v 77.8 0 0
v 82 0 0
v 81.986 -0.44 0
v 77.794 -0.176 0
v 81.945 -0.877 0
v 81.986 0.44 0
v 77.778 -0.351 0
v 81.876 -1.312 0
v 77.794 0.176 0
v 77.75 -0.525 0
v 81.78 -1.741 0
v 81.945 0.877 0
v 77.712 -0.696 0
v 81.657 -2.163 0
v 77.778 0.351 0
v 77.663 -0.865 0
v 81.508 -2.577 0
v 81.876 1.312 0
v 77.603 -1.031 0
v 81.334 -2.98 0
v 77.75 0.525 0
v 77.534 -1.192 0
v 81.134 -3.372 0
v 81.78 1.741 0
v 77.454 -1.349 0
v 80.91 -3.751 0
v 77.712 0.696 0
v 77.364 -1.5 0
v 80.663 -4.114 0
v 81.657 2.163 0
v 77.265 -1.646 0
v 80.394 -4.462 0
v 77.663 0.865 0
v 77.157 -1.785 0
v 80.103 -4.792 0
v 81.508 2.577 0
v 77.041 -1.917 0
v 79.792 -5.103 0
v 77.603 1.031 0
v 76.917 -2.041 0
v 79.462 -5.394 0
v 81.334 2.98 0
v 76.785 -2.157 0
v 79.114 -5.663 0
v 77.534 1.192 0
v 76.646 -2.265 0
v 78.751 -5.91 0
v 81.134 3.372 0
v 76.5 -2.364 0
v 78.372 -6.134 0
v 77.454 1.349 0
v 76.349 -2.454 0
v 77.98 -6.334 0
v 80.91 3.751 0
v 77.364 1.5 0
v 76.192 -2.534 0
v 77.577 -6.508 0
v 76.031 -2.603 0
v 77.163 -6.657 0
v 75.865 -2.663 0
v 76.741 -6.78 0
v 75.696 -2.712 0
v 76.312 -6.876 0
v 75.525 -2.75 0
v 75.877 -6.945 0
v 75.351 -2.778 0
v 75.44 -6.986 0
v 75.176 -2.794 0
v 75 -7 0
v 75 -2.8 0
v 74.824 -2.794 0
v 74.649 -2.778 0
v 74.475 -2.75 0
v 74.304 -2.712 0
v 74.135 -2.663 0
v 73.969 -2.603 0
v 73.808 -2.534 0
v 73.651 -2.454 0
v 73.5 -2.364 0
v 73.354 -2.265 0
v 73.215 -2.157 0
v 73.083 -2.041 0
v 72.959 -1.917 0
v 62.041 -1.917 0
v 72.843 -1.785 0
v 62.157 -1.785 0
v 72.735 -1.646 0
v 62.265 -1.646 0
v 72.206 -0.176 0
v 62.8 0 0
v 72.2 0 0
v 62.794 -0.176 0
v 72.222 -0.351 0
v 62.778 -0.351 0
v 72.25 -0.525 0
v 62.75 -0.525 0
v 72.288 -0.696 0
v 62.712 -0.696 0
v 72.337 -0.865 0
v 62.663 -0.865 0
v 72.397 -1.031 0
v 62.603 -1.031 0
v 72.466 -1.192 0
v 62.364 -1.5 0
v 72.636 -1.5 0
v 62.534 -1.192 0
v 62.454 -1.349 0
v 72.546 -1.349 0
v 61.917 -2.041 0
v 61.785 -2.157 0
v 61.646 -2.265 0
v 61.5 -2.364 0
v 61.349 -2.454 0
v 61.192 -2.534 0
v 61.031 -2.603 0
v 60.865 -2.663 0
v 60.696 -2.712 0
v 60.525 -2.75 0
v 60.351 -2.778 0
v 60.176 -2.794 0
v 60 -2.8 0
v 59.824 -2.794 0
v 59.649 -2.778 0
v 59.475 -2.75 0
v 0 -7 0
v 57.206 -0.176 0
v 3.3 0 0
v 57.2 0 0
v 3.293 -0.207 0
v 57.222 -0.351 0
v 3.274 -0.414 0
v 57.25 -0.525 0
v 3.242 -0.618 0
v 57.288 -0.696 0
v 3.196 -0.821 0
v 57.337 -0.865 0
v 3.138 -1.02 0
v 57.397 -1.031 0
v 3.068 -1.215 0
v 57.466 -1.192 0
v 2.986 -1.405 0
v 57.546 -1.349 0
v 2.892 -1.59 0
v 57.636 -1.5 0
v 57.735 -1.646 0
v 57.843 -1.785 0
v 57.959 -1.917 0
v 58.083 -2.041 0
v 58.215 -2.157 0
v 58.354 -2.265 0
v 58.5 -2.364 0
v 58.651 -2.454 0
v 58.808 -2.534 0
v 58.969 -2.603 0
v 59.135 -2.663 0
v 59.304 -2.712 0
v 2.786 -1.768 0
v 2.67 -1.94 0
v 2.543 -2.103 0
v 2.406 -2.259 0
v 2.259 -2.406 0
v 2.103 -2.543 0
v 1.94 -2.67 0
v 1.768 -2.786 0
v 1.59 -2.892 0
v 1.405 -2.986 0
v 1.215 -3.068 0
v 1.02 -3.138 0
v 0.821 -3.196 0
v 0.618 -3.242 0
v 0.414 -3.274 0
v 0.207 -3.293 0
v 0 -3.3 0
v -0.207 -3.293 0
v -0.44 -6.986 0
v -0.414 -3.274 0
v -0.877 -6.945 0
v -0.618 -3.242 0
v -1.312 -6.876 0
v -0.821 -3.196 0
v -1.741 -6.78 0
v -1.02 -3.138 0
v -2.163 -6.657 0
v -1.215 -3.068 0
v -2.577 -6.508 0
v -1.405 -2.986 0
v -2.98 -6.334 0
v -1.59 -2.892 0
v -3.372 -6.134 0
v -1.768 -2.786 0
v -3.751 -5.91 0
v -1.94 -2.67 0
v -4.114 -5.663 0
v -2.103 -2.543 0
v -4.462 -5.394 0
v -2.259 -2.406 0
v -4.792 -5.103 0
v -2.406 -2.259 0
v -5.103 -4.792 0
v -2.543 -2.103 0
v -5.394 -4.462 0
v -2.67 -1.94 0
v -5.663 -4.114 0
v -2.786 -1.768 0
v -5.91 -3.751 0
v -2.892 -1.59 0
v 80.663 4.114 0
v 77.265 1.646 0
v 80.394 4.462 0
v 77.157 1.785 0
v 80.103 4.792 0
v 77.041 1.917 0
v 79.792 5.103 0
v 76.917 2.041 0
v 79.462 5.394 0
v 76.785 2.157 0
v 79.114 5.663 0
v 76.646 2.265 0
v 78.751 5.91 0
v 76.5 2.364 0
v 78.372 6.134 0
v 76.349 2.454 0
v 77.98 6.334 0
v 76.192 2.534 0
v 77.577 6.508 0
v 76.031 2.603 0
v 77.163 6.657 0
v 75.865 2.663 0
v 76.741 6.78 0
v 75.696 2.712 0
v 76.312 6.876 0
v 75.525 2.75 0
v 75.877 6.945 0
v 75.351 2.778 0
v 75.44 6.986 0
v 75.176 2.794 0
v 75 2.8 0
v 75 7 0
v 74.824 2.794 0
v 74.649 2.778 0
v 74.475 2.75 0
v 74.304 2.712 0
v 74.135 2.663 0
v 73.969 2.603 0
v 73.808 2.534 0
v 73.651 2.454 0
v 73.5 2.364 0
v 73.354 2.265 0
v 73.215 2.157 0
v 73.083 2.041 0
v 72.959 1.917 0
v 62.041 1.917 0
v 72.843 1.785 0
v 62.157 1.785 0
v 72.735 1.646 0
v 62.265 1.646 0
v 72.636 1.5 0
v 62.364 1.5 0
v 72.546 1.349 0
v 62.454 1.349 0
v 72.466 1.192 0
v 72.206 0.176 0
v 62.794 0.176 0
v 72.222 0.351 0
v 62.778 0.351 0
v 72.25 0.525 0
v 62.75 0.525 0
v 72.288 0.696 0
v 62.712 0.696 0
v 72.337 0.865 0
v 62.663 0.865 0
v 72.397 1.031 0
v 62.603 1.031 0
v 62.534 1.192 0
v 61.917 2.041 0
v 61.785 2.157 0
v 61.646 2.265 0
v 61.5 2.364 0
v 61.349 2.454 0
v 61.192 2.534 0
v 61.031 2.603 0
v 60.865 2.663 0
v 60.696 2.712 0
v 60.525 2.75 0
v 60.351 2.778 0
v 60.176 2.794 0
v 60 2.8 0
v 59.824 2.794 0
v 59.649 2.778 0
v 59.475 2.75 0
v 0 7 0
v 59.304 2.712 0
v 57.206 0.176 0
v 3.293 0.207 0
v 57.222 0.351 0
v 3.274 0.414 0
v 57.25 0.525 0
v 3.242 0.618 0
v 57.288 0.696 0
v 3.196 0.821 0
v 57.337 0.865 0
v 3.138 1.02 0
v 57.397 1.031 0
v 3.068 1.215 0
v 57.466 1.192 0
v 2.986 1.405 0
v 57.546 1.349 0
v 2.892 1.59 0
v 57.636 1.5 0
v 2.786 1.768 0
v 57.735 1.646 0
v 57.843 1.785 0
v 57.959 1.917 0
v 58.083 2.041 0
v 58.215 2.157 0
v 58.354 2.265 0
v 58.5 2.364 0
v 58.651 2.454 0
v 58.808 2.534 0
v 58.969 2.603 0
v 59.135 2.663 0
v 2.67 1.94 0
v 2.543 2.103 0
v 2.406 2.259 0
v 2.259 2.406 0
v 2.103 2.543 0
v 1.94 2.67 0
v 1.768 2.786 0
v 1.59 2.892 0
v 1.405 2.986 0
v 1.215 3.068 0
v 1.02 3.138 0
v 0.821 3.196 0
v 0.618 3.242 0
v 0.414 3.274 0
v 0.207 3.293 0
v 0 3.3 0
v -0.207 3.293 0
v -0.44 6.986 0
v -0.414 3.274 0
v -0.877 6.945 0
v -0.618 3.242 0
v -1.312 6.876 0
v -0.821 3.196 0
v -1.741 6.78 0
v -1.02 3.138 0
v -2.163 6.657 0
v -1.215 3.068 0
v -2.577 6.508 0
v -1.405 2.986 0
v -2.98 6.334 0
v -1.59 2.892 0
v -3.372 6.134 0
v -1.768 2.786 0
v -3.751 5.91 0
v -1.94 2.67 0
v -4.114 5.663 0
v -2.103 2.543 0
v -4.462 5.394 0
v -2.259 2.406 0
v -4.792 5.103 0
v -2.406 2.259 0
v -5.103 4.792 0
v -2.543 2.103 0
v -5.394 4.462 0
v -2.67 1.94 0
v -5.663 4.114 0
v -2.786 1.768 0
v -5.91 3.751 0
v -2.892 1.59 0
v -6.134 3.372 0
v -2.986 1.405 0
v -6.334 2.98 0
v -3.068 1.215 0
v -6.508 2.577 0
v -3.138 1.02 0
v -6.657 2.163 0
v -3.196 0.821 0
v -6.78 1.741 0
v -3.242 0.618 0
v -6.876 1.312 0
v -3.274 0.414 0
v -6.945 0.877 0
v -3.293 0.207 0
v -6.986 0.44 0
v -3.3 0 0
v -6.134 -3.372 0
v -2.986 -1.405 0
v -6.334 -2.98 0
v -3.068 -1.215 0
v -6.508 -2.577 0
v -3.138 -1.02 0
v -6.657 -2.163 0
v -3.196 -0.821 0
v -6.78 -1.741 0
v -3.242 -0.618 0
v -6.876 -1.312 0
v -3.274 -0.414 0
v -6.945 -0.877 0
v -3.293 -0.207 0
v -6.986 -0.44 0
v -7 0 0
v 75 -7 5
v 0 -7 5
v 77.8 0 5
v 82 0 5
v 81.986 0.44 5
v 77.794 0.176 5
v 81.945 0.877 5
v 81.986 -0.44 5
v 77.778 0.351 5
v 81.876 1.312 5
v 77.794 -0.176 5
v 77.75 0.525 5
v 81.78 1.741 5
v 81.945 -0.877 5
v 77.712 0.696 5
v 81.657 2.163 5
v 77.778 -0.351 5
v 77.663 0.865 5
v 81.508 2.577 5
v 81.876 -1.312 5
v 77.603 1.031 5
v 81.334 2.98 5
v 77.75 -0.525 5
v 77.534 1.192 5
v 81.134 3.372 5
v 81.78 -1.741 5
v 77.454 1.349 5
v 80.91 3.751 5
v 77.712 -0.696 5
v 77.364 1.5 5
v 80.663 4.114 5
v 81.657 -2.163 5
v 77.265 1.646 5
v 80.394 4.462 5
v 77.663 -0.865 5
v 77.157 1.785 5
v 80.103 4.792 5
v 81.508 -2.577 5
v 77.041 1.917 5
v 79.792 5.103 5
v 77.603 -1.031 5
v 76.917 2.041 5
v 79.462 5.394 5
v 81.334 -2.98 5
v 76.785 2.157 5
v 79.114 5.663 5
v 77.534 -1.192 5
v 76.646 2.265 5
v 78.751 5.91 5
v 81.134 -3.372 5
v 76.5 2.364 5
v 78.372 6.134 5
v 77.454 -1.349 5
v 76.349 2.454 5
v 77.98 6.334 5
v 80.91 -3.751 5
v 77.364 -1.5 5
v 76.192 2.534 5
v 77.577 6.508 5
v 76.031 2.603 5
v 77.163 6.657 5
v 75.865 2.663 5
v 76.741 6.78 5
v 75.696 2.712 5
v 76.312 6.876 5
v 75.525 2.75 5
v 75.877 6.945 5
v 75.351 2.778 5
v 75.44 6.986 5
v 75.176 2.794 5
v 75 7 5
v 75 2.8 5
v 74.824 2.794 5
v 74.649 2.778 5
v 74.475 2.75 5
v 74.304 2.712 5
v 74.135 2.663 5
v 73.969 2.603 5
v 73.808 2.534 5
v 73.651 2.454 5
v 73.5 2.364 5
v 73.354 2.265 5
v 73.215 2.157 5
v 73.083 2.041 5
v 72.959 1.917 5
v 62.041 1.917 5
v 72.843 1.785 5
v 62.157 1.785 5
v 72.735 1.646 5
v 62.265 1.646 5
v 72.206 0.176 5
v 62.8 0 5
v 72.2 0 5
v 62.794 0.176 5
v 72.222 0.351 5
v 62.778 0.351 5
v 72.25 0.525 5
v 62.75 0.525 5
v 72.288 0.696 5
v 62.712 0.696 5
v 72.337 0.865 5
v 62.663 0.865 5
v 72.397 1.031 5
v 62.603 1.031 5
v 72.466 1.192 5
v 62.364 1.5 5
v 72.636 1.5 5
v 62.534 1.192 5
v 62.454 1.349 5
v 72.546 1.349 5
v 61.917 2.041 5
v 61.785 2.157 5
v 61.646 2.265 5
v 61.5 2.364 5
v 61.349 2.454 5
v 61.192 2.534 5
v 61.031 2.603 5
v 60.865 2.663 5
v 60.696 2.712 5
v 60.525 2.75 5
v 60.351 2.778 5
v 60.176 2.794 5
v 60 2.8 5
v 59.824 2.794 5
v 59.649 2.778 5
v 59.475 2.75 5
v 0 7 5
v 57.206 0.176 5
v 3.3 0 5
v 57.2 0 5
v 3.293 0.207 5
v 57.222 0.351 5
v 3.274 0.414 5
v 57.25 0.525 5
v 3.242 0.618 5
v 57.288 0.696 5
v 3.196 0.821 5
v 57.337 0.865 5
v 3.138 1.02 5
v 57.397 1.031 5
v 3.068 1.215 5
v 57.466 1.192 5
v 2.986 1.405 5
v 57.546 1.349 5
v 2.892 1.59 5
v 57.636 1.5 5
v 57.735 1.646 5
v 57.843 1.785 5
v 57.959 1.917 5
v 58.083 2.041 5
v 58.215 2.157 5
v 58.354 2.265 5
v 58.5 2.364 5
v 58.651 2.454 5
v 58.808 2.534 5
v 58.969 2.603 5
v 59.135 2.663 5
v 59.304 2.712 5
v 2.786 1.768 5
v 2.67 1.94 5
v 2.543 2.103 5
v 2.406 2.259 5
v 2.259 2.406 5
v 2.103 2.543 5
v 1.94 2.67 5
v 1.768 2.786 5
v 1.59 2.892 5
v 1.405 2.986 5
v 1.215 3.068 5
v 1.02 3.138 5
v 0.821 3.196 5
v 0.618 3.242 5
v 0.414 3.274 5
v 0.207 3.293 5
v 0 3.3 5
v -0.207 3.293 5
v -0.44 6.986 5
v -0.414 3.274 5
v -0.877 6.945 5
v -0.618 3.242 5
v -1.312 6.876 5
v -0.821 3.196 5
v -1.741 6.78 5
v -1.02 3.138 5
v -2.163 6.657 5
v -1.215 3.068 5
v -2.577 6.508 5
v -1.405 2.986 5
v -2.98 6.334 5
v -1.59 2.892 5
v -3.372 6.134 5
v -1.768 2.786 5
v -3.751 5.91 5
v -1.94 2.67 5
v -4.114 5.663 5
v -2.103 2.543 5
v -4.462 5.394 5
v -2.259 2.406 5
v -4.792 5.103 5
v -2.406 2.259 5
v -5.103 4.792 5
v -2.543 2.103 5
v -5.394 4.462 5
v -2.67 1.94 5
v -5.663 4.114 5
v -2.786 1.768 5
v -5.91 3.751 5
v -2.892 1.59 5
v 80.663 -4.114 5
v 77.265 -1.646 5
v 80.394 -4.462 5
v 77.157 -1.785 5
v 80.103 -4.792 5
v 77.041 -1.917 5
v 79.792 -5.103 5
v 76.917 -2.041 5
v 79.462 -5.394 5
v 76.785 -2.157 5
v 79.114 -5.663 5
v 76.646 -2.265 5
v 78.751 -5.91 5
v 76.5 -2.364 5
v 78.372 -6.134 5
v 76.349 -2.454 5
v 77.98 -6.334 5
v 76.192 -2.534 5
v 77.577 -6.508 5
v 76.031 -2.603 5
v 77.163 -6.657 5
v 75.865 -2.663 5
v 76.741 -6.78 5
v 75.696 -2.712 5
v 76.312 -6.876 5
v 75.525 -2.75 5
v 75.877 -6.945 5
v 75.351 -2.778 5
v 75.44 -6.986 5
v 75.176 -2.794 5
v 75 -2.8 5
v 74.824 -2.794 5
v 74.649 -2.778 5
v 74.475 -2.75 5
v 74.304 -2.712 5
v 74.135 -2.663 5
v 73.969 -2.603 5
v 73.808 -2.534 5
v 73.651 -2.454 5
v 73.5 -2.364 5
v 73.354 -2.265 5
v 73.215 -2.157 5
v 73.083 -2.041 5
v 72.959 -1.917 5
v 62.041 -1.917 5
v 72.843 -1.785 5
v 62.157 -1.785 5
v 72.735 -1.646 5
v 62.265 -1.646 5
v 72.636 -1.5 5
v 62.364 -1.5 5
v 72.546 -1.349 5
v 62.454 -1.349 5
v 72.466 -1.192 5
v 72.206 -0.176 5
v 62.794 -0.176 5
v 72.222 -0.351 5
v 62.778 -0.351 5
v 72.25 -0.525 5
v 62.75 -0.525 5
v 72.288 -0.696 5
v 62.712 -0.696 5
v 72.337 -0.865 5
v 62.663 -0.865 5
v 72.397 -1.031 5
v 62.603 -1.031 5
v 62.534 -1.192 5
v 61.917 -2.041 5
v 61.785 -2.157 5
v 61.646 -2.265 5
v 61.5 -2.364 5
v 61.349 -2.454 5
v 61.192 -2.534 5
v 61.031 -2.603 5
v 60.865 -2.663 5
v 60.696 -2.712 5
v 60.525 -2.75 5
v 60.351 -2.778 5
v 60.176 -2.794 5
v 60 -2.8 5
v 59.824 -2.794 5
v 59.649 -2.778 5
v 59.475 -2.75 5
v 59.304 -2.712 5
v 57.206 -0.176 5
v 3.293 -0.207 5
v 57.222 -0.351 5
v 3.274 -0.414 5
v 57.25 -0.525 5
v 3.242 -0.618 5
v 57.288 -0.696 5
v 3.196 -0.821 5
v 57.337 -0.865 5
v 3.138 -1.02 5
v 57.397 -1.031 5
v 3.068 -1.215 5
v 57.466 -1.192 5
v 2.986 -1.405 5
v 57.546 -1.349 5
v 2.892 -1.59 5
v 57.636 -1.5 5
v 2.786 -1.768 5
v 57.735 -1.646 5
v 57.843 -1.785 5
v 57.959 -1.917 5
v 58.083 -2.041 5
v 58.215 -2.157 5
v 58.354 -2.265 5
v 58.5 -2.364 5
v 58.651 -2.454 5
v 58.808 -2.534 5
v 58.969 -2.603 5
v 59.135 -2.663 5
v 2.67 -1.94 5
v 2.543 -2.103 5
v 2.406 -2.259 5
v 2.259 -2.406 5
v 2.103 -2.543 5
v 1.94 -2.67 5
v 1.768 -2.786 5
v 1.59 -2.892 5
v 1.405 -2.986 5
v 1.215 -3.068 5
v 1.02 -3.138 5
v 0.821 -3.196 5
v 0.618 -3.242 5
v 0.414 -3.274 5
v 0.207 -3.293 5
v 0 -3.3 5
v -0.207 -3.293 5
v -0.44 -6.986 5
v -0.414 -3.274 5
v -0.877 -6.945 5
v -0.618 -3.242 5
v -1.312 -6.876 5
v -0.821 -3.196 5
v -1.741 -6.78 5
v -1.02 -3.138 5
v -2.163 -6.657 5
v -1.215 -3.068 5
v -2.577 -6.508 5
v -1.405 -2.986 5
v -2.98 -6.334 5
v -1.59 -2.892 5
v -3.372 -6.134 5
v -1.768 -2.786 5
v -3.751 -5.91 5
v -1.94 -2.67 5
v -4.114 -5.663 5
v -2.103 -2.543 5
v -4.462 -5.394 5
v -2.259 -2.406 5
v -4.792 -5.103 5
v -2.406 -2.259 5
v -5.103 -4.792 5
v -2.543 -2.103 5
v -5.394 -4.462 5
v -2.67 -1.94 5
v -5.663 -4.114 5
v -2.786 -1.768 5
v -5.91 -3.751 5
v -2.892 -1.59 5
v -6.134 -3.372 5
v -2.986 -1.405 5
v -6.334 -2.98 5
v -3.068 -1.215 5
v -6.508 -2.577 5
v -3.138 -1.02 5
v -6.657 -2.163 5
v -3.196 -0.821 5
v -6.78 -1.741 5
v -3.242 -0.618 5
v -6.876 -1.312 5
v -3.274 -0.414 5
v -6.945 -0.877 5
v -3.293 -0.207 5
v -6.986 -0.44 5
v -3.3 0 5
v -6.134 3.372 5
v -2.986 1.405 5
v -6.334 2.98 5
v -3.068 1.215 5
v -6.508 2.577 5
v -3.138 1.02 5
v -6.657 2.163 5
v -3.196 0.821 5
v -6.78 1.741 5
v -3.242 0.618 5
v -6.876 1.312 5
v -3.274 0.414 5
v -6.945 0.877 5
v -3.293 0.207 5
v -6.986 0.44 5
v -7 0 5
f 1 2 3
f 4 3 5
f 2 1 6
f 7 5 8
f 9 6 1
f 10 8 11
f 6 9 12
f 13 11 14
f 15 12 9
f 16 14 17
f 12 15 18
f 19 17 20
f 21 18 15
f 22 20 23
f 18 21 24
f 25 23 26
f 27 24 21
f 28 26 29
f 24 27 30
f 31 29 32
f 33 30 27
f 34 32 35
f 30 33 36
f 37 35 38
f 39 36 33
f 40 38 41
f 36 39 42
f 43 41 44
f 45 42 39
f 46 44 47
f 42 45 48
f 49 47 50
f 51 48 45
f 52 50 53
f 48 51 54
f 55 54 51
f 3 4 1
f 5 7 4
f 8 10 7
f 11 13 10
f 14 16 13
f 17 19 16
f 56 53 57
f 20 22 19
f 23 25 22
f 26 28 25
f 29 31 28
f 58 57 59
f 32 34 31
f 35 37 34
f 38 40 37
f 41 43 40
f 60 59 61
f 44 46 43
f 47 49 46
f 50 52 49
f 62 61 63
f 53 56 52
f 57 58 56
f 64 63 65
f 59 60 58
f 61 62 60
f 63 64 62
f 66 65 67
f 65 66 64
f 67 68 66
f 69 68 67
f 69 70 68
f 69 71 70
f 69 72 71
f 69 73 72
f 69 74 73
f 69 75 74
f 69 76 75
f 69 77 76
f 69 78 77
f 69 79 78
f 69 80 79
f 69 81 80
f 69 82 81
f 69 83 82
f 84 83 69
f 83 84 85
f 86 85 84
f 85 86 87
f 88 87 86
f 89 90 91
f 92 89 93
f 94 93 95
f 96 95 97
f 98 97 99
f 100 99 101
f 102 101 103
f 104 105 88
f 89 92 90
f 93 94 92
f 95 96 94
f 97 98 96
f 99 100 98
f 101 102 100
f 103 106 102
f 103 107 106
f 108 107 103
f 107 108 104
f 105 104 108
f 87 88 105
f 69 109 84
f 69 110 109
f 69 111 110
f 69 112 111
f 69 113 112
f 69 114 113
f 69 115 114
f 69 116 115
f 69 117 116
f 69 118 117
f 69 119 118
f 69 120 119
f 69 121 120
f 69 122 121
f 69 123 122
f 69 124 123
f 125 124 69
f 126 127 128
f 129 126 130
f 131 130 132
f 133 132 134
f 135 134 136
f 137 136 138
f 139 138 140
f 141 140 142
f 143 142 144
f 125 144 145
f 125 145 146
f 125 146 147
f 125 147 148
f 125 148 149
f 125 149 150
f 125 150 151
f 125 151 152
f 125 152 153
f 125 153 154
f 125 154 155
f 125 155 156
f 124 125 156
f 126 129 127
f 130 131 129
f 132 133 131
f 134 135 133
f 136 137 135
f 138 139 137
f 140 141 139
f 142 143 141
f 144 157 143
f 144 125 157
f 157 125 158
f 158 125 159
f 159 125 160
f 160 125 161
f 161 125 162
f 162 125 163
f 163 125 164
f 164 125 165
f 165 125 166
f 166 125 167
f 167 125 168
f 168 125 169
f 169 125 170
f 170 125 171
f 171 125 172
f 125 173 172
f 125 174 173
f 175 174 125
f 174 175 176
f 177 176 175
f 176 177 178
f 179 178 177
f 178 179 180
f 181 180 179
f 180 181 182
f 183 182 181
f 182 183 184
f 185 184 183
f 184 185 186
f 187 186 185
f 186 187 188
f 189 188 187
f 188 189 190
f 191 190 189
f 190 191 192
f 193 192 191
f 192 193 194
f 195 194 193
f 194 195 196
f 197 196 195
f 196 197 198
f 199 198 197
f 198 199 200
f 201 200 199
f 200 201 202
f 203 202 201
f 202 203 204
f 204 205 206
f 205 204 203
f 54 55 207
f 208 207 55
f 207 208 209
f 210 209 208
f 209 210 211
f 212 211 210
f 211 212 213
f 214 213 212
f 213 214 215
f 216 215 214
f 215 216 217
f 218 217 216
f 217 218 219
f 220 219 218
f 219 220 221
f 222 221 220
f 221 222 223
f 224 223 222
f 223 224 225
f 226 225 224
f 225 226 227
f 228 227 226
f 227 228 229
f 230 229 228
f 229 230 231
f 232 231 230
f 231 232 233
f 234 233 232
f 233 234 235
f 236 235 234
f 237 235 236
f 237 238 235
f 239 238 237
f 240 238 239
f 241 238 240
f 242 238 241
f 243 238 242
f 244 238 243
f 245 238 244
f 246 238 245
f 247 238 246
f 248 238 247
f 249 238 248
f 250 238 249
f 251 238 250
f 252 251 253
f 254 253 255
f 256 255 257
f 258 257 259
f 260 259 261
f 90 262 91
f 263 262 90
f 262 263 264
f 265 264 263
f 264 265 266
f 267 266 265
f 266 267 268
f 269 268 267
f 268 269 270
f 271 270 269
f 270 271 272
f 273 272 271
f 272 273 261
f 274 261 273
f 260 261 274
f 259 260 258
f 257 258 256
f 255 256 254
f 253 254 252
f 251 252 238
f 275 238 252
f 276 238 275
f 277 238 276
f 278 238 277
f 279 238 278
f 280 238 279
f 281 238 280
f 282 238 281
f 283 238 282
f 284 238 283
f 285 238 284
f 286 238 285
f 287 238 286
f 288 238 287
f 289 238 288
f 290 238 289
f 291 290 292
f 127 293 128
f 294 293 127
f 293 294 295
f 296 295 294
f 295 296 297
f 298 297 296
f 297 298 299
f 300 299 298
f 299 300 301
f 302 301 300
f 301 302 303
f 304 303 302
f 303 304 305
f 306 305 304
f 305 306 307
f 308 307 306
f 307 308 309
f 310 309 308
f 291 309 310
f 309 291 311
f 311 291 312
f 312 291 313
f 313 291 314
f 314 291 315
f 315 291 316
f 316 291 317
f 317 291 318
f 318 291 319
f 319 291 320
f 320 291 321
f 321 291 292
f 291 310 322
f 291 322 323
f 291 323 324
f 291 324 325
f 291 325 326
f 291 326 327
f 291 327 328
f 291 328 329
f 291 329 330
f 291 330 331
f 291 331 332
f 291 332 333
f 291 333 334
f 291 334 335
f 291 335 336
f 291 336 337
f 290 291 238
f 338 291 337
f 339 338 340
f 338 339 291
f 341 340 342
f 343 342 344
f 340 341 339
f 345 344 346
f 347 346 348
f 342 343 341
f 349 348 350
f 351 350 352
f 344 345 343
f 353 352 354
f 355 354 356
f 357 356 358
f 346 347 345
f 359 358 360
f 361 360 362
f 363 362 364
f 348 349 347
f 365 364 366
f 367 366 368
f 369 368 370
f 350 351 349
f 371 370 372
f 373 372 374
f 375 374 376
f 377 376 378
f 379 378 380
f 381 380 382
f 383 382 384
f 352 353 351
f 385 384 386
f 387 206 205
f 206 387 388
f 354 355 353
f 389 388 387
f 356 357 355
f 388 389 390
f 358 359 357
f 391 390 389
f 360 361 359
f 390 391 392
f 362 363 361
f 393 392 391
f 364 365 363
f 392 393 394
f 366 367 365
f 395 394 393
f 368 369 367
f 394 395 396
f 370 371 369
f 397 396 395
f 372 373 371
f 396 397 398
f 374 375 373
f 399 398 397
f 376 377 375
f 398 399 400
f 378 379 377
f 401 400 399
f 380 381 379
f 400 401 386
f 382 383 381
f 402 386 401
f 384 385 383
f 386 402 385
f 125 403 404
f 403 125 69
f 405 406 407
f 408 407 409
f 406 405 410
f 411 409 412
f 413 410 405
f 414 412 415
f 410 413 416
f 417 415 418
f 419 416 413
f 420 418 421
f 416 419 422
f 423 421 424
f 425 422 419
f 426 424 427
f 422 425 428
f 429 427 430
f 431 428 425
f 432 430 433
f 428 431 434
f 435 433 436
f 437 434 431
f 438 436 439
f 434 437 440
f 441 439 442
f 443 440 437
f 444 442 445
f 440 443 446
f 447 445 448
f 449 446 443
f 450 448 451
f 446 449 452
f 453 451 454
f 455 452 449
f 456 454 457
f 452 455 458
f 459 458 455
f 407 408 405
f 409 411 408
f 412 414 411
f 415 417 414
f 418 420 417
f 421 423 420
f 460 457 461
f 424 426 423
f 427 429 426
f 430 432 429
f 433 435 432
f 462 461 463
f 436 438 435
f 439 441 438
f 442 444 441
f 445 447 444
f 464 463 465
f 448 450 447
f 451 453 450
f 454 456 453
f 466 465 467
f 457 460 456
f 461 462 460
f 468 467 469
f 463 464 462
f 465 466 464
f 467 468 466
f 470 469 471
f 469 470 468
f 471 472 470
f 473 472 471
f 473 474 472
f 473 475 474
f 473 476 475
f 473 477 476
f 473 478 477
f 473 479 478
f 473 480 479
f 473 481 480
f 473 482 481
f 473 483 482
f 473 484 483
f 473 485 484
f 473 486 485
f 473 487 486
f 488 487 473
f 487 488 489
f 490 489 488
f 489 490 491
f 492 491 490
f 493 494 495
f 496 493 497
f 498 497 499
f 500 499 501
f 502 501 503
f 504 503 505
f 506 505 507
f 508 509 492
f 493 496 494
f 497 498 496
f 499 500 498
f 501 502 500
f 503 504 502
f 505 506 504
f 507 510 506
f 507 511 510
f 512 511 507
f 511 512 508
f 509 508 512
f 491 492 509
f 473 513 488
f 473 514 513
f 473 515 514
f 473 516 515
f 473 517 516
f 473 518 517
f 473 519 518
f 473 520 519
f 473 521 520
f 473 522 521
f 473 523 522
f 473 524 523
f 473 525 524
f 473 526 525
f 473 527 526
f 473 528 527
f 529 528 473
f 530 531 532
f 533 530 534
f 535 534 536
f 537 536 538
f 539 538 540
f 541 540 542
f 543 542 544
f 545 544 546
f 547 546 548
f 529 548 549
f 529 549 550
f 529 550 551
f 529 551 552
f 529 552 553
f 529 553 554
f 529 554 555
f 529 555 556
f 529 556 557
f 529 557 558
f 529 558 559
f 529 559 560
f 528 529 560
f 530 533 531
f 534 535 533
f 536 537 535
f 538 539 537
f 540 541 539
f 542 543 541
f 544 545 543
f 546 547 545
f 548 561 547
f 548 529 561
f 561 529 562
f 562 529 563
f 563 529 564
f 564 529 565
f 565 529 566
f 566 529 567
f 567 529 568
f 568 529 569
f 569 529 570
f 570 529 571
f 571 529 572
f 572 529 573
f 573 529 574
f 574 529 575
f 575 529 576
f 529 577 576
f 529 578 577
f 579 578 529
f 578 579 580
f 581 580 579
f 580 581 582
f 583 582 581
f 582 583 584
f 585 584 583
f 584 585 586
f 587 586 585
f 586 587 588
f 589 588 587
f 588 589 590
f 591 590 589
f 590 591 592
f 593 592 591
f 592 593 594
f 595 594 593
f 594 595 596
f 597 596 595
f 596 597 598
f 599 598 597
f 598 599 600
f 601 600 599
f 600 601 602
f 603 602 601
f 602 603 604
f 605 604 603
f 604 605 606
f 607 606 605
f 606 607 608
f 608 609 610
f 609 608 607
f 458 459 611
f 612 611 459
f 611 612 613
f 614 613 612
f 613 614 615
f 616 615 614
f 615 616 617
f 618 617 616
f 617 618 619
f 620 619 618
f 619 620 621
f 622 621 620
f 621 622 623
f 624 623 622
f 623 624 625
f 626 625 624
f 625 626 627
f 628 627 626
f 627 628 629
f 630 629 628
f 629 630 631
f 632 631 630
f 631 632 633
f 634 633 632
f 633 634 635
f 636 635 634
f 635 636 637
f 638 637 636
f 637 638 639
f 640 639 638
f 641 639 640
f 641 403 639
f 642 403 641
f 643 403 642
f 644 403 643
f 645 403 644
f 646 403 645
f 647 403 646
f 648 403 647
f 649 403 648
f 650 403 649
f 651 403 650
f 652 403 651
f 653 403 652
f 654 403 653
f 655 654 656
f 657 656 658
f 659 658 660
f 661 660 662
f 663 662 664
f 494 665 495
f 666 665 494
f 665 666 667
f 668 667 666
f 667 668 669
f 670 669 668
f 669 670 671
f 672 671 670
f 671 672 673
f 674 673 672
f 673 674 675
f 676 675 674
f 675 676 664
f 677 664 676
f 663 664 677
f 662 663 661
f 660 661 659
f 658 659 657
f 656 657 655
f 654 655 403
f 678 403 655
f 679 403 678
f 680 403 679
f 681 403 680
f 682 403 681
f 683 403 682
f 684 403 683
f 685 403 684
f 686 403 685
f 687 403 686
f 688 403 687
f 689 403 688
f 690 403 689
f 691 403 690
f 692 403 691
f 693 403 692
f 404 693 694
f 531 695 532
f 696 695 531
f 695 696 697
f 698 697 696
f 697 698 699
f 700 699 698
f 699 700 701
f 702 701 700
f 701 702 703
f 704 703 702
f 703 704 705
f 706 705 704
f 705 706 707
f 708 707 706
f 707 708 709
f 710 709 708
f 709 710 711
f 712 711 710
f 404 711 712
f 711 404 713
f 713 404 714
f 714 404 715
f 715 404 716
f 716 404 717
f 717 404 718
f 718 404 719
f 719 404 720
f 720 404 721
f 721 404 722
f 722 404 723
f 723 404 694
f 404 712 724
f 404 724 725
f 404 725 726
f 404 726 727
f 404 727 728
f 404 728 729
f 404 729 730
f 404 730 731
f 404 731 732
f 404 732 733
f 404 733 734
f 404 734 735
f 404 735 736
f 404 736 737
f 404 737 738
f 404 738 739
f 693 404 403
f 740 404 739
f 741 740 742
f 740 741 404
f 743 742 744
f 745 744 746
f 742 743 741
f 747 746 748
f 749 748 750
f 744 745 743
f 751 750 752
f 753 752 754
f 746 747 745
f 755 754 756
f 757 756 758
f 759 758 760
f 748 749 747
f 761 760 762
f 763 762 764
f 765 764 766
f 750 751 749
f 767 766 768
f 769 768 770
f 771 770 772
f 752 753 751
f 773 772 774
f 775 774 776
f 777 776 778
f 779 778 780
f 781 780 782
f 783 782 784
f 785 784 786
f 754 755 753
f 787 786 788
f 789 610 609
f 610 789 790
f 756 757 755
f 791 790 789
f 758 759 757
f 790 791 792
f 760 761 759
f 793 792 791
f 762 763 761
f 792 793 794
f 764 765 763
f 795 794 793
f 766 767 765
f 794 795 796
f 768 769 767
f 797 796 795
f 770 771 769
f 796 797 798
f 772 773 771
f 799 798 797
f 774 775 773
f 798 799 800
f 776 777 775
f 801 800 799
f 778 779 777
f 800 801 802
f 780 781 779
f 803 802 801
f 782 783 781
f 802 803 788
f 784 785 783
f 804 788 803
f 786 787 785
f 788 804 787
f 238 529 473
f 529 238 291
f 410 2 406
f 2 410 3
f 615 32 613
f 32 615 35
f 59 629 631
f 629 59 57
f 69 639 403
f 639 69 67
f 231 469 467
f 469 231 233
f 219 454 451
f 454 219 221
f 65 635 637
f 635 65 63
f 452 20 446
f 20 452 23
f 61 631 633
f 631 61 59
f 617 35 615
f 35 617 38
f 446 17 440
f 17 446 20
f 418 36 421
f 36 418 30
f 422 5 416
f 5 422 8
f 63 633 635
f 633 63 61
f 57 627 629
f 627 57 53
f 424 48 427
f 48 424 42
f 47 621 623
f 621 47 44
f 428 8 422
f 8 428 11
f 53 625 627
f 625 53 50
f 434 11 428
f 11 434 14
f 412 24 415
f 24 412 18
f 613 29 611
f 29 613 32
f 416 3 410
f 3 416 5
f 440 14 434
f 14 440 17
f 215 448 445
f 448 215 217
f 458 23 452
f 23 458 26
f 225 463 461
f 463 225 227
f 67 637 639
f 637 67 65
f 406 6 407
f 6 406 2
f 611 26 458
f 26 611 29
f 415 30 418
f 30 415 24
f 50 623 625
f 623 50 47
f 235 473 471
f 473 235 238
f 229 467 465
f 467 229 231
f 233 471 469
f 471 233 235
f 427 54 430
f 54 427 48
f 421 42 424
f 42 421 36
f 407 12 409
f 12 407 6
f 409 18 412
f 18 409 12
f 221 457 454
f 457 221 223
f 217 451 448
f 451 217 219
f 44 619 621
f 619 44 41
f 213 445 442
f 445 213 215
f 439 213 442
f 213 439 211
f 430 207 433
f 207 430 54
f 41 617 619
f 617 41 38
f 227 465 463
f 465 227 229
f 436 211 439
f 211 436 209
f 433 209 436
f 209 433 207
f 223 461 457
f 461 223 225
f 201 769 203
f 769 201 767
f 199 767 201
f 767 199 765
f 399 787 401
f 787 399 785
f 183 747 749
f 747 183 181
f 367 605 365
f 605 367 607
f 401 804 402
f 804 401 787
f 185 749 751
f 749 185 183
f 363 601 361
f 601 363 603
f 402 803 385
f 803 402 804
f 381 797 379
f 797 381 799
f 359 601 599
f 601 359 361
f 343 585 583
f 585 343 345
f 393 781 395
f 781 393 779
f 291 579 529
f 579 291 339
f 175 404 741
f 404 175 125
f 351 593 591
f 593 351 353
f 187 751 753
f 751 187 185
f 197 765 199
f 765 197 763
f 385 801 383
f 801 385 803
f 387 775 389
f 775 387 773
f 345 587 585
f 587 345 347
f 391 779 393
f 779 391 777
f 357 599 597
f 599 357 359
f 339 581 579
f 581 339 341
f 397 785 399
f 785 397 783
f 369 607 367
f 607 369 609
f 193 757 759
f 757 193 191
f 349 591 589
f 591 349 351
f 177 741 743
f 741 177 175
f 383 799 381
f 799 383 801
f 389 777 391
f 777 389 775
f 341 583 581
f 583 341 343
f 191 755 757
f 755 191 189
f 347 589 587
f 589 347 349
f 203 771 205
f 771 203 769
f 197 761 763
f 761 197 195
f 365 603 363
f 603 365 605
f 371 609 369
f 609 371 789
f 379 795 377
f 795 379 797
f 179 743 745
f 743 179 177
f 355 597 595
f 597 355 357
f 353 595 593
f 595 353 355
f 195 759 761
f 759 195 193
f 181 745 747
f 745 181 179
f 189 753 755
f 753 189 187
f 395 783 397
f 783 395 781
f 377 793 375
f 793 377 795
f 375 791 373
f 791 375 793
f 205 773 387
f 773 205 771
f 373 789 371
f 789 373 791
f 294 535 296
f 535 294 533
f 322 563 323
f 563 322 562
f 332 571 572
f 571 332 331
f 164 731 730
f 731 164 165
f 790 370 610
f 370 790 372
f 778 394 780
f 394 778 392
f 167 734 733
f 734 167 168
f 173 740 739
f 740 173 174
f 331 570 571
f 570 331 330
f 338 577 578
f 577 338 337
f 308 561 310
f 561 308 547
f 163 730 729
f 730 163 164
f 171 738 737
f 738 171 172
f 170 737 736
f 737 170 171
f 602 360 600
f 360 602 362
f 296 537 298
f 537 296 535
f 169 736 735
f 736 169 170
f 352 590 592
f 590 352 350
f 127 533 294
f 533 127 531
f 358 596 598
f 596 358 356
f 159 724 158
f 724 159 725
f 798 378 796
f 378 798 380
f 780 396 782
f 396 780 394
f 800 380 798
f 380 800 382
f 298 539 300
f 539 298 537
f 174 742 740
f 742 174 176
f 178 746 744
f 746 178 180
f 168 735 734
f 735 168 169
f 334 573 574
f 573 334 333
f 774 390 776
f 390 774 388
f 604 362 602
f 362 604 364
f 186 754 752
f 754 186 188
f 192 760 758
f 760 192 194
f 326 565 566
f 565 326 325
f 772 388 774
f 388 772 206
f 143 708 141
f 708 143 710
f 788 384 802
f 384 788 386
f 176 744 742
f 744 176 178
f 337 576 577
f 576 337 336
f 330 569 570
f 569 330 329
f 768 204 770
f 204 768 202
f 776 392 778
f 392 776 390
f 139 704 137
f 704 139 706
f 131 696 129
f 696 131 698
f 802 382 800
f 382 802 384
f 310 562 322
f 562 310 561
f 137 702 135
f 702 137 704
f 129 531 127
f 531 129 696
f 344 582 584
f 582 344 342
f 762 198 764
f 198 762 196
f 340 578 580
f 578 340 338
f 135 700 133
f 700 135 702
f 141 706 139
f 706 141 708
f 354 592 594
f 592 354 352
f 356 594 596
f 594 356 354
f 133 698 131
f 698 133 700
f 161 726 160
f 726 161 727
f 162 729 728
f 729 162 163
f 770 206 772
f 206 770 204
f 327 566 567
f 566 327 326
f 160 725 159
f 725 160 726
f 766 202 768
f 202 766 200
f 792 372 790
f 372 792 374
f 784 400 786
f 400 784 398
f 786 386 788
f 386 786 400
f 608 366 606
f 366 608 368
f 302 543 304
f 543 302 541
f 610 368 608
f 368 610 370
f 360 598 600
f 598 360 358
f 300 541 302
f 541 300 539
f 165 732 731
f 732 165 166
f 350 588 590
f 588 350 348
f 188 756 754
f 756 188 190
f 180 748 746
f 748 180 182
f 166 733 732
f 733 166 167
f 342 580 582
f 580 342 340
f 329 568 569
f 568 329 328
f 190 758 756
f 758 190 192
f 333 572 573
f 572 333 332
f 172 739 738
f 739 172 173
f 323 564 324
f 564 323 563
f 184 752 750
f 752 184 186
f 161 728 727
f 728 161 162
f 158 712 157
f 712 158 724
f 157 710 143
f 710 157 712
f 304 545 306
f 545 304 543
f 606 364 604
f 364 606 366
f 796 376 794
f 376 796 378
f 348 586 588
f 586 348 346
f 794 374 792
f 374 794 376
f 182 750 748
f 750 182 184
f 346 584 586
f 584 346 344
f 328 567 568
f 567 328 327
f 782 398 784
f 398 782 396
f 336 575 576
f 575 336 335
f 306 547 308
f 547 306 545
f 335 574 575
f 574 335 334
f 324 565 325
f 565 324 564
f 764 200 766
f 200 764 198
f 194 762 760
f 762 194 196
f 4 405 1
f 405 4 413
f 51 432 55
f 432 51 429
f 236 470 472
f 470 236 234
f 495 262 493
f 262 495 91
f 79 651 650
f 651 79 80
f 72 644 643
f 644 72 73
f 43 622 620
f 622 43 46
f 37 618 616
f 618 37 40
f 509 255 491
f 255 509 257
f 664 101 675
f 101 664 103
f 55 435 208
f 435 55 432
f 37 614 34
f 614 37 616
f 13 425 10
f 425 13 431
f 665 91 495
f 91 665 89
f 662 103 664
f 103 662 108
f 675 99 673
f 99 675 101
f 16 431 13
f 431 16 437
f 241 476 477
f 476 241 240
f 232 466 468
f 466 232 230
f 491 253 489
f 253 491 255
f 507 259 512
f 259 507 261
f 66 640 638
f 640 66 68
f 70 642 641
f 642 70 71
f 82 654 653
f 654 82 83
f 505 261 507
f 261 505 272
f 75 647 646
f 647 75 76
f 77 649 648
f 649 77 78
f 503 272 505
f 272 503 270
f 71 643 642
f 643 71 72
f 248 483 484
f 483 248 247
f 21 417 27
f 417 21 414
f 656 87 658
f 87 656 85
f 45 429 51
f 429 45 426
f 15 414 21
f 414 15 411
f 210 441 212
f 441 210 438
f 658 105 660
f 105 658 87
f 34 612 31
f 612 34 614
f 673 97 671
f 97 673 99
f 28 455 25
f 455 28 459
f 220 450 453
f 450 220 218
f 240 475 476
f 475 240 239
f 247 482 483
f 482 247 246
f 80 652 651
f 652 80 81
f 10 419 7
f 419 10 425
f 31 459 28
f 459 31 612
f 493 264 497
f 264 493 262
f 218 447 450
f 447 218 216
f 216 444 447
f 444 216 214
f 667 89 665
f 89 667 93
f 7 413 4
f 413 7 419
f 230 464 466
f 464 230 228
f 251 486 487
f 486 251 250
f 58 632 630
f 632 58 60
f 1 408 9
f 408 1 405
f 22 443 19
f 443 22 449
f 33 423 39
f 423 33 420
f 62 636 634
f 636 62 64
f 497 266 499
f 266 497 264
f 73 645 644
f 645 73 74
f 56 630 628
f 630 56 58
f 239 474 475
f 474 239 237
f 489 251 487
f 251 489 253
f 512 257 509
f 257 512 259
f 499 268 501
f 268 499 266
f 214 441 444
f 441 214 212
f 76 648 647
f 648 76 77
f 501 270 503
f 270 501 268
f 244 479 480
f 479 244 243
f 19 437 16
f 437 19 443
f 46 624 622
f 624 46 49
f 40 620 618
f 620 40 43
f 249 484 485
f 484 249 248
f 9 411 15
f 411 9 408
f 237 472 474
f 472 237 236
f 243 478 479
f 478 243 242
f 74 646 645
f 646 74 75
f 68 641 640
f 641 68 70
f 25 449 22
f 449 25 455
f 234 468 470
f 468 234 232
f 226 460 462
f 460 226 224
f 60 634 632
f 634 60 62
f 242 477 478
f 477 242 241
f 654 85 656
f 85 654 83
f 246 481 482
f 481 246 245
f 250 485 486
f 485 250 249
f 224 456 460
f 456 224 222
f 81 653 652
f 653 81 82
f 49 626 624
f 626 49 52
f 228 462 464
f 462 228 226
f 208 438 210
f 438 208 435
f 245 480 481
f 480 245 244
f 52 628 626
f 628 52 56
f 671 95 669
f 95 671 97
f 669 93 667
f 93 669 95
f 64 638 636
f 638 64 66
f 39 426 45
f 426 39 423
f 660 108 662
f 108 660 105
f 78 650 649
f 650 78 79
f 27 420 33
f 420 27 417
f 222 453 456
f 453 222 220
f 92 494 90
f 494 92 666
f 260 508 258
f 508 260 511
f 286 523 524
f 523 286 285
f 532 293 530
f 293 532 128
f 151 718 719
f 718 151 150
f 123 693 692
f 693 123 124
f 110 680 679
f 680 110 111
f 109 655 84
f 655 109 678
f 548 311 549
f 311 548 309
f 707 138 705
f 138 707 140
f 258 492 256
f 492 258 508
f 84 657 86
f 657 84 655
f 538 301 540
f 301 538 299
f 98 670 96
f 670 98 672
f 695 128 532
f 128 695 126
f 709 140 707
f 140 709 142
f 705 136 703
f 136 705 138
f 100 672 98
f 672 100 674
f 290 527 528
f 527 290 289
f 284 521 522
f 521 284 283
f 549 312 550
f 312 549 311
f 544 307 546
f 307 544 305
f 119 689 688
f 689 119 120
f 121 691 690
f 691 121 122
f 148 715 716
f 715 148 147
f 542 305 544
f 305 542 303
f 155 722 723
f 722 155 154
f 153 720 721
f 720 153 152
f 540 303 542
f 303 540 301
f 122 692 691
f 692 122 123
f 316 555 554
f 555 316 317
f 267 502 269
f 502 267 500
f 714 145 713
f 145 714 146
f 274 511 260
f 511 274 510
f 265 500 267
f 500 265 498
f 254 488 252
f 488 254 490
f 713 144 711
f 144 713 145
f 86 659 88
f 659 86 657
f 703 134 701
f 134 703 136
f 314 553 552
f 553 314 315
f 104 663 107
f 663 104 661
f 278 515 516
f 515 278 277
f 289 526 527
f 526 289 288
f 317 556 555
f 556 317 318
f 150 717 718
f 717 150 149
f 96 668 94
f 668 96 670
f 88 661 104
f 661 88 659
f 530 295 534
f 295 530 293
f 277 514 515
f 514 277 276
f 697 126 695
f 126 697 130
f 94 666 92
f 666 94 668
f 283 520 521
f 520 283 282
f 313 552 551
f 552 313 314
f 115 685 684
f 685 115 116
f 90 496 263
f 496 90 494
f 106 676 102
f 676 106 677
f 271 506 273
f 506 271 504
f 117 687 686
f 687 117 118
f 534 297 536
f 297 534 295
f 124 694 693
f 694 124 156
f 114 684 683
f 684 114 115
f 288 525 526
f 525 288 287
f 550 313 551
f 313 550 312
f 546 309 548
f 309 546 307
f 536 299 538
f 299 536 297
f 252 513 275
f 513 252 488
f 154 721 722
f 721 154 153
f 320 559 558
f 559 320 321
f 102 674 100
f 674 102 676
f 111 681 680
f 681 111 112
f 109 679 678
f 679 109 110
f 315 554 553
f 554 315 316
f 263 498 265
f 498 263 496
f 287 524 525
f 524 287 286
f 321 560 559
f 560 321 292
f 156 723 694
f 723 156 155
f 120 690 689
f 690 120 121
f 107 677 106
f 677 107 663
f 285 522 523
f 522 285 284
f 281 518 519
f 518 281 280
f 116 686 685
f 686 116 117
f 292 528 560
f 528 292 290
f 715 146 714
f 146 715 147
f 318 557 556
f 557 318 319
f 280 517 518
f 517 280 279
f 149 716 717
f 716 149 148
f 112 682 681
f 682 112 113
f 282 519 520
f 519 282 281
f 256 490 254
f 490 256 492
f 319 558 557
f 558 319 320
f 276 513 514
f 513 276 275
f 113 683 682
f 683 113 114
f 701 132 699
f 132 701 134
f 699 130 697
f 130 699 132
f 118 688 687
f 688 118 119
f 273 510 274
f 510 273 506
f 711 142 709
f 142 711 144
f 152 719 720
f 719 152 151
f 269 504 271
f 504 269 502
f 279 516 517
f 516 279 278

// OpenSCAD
$fn=100;

difference() {
  union() {
    linear_extrude(5) polygon([
      [0,-7],
      [0,7],
      [75,7],
      [75,-7],
    ]);
    translate([75,0,0])
      linear_extrude(5) circle(7);
    linear_extrude(5) circle(7);
  }
  translate([0,0,-1])
    linear_extrude(14) circle(3.3);
  translate([75,0,-1])
    linear_extrude(10) circle(2.8);
  translate([60,0,-1])
    linear_extrude(10) circle(2.8);
}
